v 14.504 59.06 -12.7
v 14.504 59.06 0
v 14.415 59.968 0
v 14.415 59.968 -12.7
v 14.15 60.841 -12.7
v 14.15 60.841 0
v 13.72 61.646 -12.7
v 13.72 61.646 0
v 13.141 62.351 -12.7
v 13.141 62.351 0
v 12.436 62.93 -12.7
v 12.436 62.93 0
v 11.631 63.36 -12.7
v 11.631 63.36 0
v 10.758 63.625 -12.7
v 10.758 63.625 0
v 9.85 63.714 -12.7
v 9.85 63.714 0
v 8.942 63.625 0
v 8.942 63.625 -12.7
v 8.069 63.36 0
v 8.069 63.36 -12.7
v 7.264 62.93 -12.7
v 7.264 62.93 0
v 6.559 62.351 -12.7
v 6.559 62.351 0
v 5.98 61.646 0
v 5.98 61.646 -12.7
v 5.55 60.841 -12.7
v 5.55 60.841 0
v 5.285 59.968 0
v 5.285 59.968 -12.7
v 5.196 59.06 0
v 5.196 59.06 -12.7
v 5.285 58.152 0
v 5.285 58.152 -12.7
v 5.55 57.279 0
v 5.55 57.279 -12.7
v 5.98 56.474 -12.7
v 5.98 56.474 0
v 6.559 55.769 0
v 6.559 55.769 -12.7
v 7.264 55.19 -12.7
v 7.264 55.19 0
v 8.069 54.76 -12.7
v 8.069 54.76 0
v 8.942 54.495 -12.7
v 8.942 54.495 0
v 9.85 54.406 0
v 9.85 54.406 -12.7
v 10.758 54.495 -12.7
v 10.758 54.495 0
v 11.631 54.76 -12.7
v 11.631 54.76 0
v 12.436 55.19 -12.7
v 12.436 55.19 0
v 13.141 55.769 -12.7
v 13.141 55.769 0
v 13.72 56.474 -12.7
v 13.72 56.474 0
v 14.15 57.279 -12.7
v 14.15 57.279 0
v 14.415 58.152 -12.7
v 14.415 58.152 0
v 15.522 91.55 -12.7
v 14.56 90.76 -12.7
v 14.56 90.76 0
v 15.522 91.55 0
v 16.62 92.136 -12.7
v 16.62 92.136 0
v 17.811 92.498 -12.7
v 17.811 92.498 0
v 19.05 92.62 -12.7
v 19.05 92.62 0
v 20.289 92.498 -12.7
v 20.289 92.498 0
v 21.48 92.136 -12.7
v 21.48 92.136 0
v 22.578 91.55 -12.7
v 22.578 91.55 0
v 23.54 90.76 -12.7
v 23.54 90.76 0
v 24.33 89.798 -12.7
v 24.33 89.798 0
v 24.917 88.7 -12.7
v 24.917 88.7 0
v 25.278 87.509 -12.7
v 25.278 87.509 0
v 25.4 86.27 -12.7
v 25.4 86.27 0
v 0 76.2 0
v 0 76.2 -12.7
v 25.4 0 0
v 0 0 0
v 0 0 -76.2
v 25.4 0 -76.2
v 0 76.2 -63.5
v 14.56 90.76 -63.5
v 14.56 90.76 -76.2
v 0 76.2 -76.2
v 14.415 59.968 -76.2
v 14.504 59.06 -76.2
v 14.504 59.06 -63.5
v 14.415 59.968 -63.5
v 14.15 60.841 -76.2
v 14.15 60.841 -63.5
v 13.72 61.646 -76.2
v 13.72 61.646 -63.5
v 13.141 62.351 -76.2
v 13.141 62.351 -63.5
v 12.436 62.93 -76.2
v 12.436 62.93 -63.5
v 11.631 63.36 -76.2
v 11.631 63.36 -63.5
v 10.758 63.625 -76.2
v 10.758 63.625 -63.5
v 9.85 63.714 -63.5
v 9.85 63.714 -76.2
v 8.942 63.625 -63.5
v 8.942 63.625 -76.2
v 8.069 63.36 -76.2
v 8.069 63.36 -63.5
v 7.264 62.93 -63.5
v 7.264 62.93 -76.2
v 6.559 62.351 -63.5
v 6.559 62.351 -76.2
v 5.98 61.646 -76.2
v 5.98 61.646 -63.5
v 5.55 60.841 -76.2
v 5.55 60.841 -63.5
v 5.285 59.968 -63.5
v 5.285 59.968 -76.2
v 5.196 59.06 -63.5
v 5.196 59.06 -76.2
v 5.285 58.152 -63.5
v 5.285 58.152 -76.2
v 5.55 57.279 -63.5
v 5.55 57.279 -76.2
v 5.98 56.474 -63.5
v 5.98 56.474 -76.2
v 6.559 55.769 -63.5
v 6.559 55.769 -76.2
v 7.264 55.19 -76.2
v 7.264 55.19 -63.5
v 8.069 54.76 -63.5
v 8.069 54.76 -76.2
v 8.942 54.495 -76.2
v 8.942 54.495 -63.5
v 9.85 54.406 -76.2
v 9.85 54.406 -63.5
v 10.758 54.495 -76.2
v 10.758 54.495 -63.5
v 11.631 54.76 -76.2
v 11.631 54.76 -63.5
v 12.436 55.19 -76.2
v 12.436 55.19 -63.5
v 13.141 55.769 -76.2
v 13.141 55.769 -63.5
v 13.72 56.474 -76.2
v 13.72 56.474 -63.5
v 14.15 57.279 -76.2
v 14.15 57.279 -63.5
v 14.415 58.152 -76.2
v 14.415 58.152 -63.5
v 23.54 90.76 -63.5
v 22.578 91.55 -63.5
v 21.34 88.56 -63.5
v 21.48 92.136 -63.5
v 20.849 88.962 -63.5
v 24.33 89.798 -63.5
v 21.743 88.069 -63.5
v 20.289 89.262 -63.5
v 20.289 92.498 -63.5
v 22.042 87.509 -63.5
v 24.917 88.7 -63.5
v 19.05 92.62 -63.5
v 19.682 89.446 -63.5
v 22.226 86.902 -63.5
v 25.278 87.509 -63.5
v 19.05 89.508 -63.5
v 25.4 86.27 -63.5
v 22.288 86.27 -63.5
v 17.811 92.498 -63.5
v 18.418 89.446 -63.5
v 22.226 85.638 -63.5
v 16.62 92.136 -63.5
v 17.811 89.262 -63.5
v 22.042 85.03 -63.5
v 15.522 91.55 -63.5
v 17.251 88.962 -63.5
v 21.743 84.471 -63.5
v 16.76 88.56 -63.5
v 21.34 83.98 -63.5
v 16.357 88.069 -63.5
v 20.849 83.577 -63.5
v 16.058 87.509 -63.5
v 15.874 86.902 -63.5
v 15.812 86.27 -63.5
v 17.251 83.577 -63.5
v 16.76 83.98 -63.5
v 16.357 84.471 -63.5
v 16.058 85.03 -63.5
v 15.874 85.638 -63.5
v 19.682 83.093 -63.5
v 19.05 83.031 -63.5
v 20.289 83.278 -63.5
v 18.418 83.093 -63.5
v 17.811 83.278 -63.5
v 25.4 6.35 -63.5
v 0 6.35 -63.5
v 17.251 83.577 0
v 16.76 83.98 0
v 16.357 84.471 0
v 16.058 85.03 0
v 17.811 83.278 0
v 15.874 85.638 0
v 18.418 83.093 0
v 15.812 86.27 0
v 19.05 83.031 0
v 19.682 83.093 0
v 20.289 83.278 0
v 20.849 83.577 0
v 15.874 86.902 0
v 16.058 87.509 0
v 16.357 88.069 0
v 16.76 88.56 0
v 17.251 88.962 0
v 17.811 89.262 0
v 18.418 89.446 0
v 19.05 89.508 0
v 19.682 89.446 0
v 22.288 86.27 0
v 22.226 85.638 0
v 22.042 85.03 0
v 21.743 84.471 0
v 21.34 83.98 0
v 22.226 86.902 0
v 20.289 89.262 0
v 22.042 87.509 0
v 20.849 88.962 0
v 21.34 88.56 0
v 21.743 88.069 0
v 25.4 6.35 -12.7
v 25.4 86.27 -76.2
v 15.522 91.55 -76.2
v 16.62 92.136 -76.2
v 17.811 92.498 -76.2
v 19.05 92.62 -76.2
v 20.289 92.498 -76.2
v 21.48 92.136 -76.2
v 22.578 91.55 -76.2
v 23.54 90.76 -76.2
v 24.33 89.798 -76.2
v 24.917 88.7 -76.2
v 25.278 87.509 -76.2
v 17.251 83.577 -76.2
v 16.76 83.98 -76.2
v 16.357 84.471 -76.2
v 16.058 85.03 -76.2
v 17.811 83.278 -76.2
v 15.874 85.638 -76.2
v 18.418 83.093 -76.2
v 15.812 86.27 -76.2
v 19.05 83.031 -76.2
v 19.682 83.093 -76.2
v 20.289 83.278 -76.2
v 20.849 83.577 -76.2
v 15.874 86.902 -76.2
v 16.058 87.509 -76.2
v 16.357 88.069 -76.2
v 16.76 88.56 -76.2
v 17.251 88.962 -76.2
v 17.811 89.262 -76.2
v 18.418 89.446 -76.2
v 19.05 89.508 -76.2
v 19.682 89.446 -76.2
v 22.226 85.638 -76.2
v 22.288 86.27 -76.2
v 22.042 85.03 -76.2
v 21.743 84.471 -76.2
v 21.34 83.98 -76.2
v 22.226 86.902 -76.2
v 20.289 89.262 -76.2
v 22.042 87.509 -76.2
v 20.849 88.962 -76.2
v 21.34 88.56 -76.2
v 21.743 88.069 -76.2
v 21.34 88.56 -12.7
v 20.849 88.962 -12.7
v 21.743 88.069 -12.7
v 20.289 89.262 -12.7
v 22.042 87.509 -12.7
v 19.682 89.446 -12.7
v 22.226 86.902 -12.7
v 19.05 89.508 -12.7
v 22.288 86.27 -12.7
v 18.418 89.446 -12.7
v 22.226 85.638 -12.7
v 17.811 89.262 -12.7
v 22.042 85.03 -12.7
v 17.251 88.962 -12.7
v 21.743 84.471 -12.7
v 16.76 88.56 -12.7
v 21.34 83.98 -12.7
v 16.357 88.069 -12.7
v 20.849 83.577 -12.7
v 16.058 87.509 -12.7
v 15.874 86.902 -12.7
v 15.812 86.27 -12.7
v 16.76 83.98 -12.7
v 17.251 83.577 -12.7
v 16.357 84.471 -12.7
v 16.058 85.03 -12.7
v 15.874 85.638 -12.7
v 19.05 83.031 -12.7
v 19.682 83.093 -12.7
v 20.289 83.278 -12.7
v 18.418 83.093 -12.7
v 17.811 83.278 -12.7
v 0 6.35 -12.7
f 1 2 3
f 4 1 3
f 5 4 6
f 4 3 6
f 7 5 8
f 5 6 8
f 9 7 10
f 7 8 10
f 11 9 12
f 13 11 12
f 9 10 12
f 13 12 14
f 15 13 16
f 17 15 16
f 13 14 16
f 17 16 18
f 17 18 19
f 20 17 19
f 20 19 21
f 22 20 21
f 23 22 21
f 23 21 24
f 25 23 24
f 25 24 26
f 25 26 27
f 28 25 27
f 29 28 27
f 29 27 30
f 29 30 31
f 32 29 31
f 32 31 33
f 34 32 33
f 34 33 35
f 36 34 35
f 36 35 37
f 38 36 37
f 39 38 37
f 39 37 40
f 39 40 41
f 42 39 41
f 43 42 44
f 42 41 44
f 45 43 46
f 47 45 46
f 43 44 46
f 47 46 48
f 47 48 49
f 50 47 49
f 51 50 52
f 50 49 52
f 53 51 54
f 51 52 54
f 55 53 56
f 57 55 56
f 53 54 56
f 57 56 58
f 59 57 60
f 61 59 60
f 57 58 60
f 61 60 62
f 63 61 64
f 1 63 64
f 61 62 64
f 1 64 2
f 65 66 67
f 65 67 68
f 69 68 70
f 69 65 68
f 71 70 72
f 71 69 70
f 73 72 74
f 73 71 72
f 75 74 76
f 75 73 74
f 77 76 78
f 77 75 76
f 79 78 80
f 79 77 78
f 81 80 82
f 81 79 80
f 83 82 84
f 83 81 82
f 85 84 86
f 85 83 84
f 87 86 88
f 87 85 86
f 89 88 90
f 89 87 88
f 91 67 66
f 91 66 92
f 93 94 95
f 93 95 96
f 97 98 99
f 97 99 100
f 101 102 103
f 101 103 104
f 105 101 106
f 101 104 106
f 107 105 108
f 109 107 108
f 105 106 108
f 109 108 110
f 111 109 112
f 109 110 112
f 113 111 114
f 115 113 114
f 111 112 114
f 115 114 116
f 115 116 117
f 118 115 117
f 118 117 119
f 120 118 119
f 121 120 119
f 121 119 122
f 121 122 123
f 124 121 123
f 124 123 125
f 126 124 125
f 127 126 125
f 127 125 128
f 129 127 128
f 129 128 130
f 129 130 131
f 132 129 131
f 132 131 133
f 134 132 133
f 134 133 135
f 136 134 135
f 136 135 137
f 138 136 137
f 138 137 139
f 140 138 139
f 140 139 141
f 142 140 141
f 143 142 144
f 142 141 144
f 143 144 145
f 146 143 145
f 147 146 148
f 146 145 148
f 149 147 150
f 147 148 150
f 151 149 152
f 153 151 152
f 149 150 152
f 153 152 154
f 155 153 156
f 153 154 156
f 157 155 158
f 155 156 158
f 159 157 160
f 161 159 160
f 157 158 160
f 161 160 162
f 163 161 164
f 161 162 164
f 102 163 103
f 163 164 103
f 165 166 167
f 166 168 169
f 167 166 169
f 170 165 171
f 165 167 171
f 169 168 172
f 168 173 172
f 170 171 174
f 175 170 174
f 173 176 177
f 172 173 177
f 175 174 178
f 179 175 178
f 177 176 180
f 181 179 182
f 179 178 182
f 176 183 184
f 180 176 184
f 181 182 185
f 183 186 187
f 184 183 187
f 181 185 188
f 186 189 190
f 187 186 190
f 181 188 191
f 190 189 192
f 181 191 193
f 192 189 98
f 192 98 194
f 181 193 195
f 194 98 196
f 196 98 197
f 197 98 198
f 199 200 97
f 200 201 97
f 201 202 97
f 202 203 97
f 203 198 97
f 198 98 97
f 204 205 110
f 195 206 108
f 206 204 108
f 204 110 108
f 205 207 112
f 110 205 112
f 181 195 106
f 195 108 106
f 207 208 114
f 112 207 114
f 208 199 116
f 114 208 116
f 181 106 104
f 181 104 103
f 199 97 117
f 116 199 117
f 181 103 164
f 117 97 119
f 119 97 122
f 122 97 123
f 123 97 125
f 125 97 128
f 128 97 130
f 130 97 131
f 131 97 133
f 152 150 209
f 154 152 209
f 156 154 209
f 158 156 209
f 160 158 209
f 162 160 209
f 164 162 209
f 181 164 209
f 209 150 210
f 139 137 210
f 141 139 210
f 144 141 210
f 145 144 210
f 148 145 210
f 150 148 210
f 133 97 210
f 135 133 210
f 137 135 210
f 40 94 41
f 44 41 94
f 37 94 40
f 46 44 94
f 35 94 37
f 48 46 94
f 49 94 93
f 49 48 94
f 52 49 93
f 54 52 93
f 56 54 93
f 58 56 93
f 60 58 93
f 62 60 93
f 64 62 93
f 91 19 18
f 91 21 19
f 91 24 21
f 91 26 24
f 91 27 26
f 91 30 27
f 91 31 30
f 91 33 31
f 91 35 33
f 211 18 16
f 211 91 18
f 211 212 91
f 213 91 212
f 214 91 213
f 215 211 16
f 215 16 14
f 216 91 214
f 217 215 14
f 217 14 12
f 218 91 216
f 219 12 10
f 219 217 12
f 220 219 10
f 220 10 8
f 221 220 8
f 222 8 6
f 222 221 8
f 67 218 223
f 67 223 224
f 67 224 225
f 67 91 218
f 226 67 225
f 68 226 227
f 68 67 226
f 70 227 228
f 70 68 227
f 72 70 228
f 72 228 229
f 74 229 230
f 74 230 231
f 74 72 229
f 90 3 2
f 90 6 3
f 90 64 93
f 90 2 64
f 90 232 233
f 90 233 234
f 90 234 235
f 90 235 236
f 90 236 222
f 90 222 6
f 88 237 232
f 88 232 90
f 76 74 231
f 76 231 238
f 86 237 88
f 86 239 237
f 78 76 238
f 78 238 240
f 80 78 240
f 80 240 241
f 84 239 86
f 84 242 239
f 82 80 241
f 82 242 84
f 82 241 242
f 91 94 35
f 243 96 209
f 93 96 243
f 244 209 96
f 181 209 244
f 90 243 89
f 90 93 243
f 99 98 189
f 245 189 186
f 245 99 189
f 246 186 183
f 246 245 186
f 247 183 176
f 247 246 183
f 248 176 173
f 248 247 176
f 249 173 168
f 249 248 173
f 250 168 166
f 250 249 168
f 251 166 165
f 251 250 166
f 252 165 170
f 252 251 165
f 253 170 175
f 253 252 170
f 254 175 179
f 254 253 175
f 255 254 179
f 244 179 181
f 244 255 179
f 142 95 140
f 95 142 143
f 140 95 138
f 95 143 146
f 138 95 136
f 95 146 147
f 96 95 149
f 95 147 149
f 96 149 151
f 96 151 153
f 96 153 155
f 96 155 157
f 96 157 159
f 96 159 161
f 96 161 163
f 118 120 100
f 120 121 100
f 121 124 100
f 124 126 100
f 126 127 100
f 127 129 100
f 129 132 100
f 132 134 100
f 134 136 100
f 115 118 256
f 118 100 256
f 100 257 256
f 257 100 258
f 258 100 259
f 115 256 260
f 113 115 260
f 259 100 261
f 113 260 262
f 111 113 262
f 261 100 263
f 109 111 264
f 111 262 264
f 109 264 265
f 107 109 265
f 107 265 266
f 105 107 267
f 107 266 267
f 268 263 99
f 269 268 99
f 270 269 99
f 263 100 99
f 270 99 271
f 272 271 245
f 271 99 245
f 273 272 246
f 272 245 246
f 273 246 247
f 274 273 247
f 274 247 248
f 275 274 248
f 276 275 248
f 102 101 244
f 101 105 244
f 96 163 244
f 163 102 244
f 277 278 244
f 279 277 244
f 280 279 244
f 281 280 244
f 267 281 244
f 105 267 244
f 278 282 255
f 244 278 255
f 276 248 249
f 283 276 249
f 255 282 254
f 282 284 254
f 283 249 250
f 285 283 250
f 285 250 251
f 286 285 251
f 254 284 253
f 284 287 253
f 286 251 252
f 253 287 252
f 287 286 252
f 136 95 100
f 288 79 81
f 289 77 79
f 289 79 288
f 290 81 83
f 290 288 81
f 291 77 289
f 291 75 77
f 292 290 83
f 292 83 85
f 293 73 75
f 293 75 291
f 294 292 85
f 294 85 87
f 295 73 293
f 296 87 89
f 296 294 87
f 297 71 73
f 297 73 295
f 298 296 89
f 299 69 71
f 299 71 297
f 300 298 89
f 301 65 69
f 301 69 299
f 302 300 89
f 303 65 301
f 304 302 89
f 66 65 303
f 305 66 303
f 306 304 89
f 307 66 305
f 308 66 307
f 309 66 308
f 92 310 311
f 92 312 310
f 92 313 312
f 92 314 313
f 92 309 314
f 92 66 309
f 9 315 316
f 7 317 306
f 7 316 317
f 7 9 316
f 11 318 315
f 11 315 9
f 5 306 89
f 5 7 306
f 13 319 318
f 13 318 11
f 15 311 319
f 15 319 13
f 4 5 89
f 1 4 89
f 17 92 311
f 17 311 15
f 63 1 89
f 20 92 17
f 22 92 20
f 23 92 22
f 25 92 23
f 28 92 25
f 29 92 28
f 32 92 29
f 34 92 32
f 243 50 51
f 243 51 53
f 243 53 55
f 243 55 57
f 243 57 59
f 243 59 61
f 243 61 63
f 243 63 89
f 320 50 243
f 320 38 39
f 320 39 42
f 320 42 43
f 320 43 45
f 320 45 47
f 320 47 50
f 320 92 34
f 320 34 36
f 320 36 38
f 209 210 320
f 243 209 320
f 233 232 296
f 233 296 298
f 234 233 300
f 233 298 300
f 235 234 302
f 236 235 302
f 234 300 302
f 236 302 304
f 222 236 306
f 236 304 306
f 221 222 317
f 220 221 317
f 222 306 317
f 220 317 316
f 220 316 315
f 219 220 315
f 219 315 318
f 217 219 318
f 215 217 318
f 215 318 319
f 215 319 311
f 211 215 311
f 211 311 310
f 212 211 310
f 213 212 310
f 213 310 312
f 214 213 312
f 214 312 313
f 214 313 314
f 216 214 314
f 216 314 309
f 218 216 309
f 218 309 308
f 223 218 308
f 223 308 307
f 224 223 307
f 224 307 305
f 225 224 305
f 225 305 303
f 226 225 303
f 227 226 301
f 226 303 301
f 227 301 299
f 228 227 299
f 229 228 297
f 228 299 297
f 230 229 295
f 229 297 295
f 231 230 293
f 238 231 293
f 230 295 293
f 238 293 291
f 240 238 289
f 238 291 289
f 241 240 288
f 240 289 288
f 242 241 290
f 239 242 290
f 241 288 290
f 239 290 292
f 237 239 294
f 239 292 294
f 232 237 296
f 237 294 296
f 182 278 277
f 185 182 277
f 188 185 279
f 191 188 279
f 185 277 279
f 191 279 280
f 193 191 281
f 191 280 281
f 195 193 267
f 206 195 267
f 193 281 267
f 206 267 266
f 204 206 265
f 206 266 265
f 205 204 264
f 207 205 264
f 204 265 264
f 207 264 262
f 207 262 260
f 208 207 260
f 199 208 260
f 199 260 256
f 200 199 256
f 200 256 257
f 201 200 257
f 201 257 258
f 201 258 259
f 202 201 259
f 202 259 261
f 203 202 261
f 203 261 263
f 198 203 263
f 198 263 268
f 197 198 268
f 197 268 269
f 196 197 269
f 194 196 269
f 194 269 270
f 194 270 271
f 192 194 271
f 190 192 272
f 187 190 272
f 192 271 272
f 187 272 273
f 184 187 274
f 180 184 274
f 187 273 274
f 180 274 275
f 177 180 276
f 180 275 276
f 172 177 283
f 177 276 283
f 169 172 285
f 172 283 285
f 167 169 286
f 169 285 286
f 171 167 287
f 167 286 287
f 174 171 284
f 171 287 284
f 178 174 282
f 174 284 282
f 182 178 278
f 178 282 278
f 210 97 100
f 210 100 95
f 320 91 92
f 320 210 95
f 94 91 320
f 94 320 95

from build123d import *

# Parameters (mm, degrees)
F0_R     = 4.654194
F1_DEPTH = 76.2
F2_R     = 6.35
F3_W     = 97.109872
F3_H     = 25.4
F4_DEPTH = 25.401
F5_R     = 3.2385
F6_DEPTH = 76.201


with BuildPart() as f1:
    # F0 (on Top) → F1 (new body)
    with BuildSketch(Plane.XY):
        Polygon((0, 76.2), (0, 0), (25.4, 0), (25.4, 101.6), align=None)
        with Locations((9.850098, 59.060045)):
            Circle(F0_R, mode=Mode.SUBTRACT)
    extrude(amount=-F1_DEPTH)

    # F2
    f2_edges = [f1.edges().sort_by_distance(p)[0] for p in [
        (25.4, 101.6, -38.1),
    ]]
    fillet(f2_edges, radius=F2_R)

    # F3 (on face) → F4 (cut, through all)
    with BuildSketch(Plane(origin=(0, 0, 0), x_dir=(0, -1, 0), z_dir=(-1, 0, 0))):
        with Locations((-54.904936, -50.8)):
            Rectangle(F3_W, F3_H)
        with Locations((-54.904936, -25.4)):
            Rectangle(F3_W, F3_H)
    extrude(amount=-F4_DEPTH, mode=Mode.SUBTRACT)

    # F5 (on face) → F6 (cut, through all)
    with BuildSketch(Plane(origin=(0, 0, -76.2), x_dir=(1, 0, 0), z_dir=(0, 0, -1))):
        with Locations((19.05, -86.269744)):
            Circle(F5_R)
    extrude(amount=-F6_DEPTH, mode=Mode.SUBTRACT)


solid = f1.part
